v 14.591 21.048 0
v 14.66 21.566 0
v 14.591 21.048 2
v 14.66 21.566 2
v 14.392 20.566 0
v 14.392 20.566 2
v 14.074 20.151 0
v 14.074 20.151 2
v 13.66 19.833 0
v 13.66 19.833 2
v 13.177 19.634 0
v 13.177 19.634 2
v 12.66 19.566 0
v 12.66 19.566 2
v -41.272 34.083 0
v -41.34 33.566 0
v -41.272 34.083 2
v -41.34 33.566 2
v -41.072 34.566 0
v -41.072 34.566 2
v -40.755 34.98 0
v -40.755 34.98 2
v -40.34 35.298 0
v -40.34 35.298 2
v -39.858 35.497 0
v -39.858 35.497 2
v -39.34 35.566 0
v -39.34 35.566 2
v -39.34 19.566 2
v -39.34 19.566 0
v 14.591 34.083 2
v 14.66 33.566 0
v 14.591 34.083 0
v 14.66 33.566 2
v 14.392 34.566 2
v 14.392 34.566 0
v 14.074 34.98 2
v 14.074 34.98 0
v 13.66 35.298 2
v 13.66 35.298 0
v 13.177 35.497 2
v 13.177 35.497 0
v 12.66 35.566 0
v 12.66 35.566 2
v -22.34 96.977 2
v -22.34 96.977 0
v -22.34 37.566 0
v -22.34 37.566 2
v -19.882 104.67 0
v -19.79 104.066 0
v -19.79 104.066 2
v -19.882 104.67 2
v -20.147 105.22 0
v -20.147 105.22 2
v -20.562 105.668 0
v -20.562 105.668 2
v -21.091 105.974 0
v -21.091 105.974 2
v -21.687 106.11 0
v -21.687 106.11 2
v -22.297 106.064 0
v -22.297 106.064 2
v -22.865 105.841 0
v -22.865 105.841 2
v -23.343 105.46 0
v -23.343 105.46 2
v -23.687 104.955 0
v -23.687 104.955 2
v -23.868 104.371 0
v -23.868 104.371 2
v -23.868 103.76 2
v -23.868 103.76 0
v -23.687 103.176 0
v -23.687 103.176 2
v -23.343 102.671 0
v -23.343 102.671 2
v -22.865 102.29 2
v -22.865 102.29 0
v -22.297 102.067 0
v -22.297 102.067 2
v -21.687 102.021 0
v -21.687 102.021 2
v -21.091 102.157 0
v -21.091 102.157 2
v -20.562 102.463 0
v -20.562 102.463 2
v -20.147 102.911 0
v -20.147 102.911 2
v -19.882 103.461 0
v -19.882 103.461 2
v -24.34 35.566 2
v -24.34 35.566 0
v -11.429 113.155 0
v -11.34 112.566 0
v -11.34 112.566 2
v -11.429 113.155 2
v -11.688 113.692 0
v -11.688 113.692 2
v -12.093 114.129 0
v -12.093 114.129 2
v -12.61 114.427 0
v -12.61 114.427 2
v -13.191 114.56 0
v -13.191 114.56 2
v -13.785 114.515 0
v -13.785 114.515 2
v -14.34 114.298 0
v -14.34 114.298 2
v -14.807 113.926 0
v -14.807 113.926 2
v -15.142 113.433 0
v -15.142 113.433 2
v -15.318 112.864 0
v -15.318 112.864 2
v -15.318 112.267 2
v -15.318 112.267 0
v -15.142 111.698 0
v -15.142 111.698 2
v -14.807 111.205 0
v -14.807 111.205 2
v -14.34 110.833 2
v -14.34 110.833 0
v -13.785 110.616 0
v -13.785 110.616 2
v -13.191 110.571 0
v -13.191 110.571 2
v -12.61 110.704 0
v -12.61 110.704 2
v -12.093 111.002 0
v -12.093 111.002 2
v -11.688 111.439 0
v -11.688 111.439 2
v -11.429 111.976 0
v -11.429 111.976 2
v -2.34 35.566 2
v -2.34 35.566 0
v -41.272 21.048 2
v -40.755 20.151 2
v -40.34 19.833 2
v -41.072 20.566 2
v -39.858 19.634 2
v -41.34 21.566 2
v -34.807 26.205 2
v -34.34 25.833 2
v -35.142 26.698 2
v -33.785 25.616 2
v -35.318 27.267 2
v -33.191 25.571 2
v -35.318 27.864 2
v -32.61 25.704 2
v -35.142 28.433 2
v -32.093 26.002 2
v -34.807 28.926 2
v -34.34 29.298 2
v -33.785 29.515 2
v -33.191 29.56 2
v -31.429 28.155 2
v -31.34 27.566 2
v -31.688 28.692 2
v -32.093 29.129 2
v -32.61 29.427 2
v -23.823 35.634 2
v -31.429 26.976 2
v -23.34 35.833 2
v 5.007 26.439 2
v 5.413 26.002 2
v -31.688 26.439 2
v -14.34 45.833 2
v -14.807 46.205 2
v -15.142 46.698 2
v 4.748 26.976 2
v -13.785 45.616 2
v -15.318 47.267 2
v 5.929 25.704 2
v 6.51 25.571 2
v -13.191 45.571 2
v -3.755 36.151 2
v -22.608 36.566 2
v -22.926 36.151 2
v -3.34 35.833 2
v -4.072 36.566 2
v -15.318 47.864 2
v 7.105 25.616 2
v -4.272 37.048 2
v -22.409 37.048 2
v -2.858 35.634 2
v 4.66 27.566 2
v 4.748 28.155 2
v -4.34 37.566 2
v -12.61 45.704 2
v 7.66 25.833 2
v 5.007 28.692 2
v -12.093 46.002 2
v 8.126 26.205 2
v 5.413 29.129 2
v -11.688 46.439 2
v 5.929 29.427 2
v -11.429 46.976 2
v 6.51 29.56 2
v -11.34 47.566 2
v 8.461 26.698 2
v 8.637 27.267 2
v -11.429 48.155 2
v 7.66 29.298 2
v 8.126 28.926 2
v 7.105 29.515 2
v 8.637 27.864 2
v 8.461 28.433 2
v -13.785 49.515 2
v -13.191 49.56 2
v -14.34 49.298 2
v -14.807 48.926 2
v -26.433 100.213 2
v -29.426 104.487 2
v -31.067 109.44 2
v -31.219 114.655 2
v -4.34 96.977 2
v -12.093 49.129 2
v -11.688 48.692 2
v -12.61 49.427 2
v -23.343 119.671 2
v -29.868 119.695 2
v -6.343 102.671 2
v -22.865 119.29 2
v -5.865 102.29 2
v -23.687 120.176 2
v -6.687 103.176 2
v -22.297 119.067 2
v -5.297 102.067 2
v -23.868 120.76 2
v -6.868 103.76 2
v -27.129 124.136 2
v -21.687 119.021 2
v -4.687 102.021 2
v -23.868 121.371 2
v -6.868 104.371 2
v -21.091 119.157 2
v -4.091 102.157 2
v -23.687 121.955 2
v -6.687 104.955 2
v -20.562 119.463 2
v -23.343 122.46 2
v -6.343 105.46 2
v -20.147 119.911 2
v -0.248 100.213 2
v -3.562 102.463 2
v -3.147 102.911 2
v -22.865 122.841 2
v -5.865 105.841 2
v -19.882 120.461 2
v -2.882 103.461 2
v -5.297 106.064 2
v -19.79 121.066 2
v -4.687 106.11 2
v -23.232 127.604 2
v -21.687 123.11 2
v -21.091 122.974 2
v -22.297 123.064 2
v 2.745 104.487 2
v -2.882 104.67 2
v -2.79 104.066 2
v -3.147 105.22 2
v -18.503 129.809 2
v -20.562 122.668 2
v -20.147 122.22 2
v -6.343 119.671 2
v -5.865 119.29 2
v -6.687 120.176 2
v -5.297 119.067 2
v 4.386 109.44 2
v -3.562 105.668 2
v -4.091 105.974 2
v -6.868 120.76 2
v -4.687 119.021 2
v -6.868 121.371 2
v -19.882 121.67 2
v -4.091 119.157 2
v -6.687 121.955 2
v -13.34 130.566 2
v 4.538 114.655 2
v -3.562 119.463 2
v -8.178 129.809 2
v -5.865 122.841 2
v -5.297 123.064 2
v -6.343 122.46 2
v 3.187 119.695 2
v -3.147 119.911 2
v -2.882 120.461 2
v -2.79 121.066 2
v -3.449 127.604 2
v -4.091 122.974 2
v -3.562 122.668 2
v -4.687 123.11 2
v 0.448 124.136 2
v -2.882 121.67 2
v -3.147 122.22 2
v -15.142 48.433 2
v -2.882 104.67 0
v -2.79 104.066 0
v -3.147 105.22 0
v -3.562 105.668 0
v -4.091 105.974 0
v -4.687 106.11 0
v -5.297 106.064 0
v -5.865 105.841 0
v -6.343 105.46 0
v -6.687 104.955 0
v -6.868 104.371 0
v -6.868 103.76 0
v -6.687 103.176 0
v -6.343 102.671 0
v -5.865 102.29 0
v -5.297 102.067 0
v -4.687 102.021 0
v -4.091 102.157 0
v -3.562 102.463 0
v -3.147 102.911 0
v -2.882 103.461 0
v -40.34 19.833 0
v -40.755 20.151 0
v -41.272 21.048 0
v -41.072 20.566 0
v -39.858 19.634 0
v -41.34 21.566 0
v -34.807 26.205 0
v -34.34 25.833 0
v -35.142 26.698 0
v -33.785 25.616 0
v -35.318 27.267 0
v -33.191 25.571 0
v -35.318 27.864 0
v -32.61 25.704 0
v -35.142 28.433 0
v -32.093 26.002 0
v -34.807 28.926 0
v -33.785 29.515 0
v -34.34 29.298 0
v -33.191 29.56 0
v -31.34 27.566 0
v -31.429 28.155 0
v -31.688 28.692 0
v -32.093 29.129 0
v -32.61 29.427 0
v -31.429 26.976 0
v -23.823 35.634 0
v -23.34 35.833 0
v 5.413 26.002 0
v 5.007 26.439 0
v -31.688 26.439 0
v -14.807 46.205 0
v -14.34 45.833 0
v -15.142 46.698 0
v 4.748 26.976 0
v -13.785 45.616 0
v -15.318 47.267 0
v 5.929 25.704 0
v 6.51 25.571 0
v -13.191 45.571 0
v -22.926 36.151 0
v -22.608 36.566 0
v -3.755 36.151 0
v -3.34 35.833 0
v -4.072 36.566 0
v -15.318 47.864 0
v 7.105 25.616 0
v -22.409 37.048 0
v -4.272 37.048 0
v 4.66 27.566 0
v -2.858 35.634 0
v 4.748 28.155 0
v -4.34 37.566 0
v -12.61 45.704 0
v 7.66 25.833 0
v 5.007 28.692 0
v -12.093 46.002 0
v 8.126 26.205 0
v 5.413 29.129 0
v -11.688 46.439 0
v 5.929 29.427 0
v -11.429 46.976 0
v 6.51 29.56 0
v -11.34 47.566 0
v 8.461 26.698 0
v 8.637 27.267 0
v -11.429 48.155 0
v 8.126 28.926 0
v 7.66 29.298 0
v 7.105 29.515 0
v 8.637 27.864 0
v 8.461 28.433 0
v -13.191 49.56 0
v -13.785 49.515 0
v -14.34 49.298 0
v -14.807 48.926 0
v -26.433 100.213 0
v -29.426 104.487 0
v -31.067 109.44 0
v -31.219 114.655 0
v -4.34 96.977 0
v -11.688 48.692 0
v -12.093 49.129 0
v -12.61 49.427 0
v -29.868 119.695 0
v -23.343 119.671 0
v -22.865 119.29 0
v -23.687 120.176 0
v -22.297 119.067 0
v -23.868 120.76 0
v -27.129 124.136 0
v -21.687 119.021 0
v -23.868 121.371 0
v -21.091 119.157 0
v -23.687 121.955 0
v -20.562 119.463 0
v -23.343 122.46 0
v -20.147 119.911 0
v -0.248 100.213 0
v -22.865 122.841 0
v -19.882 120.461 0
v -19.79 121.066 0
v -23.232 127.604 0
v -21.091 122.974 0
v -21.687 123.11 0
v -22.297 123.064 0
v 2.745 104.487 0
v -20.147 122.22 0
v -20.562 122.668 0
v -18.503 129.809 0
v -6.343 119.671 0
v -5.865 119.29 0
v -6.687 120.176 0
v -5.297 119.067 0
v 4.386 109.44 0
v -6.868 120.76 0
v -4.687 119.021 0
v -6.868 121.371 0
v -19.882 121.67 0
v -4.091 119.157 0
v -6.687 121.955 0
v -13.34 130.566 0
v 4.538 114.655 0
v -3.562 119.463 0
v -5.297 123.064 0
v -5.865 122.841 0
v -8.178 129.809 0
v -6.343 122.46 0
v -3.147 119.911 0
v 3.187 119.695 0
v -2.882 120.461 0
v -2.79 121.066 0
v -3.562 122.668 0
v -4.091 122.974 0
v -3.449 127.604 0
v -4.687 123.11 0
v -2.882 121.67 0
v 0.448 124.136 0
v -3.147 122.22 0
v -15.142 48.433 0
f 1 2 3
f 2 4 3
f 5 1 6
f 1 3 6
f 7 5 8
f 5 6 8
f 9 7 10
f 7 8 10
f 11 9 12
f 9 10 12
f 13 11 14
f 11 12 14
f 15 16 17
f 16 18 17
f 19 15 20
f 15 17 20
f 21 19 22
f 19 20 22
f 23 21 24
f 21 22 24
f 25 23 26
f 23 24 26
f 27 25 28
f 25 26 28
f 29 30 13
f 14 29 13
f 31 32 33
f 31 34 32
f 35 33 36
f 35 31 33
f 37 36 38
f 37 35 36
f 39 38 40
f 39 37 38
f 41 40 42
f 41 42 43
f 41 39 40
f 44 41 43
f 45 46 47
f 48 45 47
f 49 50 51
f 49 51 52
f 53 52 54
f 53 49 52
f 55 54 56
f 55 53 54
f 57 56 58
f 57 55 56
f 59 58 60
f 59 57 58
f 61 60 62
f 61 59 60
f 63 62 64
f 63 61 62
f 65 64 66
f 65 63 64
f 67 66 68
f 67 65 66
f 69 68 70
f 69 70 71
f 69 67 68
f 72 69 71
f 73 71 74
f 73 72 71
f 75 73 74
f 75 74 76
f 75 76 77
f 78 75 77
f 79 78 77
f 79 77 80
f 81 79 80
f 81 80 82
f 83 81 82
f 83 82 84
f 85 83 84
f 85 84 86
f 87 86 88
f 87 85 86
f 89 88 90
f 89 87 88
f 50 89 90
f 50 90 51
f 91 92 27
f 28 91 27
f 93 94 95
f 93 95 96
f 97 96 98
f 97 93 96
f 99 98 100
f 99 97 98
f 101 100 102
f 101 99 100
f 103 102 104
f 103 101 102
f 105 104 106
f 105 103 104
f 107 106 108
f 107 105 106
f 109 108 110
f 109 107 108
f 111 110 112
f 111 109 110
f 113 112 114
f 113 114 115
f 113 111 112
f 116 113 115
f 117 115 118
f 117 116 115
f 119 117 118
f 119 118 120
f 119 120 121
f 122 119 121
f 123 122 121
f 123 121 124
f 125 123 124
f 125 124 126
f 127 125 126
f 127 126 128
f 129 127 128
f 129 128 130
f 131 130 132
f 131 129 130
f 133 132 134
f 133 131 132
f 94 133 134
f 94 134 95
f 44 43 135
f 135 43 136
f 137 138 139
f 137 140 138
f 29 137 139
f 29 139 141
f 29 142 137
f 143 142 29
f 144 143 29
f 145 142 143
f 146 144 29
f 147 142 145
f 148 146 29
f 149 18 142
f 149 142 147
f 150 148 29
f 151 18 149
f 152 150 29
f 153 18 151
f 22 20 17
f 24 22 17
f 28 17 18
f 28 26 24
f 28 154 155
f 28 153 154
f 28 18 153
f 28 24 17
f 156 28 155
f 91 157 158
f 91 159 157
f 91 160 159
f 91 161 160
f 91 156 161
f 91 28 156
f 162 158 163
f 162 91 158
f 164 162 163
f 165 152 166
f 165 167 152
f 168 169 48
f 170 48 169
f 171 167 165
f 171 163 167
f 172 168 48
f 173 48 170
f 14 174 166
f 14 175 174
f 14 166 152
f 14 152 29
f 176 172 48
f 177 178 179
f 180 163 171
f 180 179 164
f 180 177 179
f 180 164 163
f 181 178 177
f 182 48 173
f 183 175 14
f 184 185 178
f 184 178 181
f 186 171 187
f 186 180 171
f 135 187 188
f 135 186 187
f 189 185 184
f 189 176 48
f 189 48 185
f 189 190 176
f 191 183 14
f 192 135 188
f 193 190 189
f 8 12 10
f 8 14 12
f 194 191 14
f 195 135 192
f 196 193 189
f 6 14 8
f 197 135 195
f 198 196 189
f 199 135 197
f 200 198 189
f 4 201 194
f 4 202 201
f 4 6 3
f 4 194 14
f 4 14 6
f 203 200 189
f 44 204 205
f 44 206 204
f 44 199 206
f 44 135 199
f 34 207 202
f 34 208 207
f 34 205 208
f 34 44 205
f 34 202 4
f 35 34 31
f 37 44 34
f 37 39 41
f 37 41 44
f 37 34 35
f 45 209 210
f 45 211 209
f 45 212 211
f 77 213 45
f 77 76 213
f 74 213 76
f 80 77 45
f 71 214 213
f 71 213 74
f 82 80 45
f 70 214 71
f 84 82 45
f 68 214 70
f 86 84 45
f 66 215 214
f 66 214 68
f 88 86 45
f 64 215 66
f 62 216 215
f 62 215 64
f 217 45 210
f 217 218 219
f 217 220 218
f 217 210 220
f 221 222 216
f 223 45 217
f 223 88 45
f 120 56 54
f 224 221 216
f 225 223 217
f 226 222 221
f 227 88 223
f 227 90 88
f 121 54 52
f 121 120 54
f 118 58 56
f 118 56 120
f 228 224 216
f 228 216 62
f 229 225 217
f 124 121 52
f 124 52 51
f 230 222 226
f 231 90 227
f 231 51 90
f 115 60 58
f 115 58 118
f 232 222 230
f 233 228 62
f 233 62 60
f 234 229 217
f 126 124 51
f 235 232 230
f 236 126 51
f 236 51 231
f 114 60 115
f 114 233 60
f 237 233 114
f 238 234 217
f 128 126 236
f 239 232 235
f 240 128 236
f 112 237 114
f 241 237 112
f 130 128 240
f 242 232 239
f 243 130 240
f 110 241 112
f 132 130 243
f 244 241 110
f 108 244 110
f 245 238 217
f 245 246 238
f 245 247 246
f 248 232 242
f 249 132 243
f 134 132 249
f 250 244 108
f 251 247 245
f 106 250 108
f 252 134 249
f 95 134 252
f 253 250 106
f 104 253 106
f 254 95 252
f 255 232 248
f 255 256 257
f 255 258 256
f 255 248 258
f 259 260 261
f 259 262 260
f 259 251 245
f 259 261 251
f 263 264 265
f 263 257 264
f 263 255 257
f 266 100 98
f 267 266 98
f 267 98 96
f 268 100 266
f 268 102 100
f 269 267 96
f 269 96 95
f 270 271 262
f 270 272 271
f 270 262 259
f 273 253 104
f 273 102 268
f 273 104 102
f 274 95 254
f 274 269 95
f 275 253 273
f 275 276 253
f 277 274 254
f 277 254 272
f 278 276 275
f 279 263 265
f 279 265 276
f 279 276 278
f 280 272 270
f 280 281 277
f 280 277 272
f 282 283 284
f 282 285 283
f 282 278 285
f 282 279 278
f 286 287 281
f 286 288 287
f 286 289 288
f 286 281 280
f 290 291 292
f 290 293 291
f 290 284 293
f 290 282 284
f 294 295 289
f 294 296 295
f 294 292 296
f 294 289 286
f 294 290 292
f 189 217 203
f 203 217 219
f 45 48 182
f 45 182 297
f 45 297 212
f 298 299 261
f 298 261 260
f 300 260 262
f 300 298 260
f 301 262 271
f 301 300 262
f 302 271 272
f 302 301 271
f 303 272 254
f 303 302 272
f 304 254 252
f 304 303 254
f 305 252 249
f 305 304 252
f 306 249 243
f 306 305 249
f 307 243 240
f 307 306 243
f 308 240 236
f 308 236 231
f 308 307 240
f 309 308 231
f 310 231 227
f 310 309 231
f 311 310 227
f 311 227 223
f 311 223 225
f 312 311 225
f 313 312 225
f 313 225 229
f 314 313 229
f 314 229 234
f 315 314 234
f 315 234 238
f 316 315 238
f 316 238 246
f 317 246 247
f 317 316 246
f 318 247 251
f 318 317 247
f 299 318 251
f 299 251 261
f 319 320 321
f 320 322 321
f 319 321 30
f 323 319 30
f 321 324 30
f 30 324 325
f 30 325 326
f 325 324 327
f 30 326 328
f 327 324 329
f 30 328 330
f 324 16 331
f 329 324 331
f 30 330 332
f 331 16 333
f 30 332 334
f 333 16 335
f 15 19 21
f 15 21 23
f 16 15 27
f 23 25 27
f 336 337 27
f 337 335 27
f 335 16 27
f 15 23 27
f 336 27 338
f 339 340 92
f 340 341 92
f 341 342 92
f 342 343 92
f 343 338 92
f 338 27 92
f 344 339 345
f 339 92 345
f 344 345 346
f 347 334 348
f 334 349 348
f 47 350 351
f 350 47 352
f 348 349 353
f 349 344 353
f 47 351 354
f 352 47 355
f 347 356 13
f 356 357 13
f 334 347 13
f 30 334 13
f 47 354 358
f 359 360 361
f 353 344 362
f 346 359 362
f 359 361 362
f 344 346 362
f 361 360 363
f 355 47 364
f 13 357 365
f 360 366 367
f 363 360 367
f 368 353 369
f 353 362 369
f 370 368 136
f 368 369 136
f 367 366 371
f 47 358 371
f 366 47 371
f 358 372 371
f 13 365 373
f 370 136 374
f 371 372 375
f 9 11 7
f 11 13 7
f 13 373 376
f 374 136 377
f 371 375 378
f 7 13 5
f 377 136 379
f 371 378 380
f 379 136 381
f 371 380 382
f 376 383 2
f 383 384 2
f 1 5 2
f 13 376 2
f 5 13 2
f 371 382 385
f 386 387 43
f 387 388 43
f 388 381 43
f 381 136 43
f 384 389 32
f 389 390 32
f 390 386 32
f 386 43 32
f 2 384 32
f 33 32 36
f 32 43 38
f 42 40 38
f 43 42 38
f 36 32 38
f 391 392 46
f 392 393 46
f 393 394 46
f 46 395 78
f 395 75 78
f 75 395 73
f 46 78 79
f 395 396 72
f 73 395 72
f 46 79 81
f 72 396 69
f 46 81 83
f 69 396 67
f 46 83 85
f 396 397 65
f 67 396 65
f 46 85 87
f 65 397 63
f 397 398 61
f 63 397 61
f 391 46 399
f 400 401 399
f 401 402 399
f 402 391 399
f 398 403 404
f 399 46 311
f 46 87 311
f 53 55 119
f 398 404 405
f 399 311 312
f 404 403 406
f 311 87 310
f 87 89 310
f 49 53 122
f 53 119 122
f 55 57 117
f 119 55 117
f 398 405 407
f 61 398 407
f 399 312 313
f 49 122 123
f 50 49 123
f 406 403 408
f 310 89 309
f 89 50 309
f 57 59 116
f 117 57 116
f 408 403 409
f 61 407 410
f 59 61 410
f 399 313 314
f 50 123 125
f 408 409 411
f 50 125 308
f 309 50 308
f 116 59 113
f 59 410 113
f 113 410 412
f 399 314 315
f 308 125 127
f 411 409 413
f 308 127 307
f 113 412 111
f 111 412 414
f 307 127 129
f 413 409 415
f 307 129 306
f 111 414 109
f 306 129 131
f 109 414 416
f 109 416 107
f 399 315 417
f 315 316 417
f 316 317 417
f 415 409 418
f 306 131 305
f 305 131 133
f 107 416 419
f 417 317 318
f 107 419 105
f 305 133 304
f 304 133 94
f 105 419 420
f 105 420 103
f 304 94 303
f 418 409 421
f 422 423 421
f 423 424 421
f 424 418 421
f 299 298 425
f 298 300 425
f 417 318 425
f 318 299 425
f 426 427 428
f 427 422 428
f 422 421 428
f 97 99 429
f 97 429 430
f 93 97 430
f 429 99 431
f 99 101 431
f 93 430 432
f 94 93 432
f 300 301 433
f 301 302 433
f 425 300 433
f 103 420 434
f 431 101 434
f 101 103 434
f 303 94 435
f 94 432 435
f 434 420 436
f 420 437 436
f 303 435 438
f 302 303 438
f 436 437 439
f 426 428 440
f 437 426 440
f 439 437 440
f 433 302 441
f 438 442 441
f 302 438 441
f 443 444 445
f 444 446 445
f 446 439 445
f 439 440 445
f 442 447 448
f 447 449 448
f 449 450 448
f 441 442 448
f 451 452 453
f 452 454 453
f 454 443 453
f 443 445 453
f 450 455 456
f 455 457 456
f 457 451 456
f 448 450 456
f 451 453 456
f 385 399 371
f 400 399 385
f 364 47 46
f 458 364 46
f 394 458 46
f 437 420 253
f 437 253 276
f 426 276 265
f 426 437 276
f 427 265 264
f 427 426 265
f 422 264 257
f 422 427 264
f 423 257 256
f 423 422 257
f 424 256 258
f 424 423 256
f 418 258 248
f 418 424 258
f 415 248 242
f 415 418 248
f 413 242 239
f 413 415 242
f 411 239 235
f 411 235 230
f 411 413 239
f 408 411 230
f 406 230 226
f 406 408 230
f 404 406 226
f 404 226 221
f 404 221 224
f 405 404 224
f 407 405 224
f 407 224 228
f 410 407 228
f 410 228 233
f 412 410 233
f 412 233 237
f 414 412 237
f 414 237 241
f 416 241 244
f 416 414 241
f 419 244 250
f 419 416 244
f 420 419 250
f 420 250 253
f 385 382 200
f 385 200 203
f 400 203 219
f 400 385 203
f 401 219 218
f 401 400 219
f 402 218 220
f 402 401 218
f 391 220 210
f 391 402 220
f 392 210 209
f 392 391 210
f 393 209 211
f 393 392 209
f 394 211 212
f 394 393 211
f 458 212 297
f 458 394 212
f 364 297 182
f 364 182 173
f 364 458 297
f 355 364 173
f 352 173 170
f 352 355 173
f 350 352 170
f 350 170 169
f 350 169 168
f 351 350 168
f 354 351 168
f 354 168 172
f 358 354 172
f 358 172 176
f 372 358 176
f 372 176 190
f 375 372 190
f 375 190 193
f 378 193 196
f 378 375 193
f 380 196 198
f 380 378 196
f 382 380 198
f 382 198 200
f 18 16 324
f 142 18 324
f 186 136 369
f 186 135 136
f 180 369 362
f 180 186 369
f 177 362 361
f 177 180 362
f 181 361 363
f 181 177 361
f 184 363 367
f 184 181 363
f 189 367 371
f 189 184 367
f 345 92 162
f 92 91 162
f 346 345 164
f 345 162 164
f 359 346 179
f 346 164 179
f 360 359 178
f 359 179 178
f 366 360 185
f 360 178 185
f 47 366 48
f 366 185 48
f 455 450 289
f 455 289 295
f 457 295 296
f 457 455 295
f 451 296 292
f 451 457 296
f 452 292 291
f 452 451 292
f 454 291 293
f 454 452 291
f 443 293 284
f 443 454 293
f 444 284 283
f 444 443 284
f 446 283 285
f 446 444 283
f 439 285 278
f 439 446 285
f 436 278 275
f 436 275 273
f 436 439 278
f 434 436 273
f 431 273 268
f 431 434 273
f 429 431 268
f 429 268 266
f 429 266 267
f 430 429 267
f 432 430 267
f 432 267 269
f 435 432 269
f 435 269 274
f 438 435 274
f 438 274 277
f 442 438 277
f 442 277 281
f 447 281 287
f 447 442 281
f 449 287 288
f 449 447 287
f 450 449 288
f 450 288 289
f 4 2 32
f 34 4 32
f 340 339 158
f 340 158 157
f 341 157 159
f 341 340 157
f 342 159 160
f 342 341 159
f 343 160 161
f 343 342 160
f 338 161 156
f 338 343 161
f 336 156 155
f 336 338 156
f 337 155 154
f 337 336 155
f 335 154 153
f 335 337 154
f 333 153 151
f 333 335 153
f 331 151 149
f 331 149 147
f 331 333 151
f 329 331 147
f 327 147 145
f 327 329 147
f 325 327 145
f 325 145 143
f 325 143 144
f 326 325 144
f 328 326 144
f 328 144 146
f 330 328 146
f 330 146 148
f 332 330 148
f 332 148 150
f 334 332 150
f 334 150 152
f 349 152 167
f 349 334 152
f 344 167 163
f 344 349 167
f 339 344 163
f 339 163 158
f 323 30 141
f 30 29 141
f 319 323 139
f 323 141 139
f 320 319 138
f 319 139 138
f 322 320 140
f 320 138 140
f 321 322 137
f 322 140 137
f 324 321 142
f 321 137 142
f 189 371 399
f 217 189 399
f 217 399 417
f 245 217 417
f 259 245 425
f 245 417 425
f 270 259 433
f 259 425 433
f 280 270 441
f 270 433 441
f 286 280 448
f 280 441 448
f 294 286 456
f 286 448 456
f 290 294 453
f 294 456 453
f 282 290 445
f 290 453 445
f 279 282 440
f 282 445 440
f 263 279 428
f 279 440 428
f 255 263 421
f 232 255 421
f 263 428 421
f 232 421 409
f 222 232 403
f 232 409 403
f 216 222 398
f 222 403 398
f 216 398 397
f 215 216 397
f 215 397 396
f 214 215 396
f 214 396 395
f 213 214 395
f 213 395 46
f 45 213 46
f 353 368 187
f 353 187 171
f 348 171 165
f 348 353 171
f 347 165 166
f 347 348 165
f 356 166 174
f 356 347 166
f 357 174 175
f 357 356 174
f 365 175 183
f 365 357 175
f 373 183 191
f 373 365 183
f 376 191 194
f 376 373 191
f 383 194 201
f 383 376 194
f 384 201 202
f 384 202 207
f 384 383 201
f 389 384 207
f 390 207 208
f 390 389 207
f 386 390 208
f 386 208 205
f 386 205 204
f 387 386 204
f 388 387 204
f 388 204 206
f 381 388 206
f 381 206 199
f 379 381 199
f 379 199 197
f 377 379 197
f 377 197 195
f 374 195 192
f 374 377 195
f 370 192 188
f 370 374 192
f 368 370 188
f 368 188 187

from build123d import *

# Parameters (mm, degrees)
SKETCH_1_R      = 2
SKETCH_1_R_2    = 2.05
EXTRUDE_1_DEPTH = 2
FILLET_1_R      = 2


with BuildPart() as part:
    # 草图1 → 凸台-拉伸1 (new body)
    with BuildSketch(Plane.XY):
        with BuildLine():
            Line((14.659550972, 19.565520938), (14.659550972, 35.565520938))
            Line((14.659550972, 35.565520938), (-4.340449028, 35.565520938))
            Line((-4.340449028, 35.565520938), (-4.340449028, 96.97706367))
            ThreePointArc((-4.340449028, 96.97706367), (-13.340449028, 130.565520938), (-22.340449028, 96.97706367))
            Line((-22.340449028, 96.97706367), (-22.340449028, 35.565520938))
            Line((-22.340449028, 35.565520938), (-41.340449028, 35.565520938))
            Line((-41.340449028, 35.565520938), (-41.340449028, 19.565520938))
            Line((-41.340449028, 19.565520938), (14.659550972, 19.565520938))
        make_face()
        with Locations((-33.340449028, 27.565520938)):
            Circle(SKETCH_1_R, mode=Mode.SUBTRACT)
        with Locations(Location((6.659550972, 27.565520938, 0), (0, 0, 180))):
            Circle(SKETCH_1_R, mode=Mode.SUBTRACT)
        with Locations((-13.340449028, 112.565520938)):
            Circle(SKETCH_1_R, mode=Mode.SUBTRACT)
        with Locations((-13.340449028, 47.565520938)):
            Circle(SKETCH_1_R, mode=Mode.SUBTRACT)
        with Locations((-4.840449028, 121.065520938)):
            Circle(SKETCH_1_R_2, mode=Mode.SUBTRACT)
        with Locations((-4.840449028, 104.065520938)):
            Circle(SKETCH_1_R_2, mode=Mode.SUBTRACT)
        with Locations((-21.840449028, 104.065520938)):
            Circle(SKETCH_1_R_2, mode=Mode.SUBTRACT)
        with Locations((-21.840449028, 121.065520938)):
            Circle(SKETCH_1_R_2, mode=Mode.SUBTRACT)
    extrude(amount=EXTRUDE_1_DEPTH)

    # 圆角1
    fillet_1_edges = [part.edges().sort_by_distance(p)[0] for p in [
        (-41.340449028, 19.565520938, 1),
        (-41.340449028, 35.565520938, 1),
        (-22.340449028, 35.565520938, 1),
        (-4.340449028, 35.565520938, 1),
        (14.659550972, 35.565520938, 1),
        (14.659550972, 19.565520938, 1),
    ]]
    fillet(fillet_1_edges, radius=FILLET_1_R)


solid = part.part
